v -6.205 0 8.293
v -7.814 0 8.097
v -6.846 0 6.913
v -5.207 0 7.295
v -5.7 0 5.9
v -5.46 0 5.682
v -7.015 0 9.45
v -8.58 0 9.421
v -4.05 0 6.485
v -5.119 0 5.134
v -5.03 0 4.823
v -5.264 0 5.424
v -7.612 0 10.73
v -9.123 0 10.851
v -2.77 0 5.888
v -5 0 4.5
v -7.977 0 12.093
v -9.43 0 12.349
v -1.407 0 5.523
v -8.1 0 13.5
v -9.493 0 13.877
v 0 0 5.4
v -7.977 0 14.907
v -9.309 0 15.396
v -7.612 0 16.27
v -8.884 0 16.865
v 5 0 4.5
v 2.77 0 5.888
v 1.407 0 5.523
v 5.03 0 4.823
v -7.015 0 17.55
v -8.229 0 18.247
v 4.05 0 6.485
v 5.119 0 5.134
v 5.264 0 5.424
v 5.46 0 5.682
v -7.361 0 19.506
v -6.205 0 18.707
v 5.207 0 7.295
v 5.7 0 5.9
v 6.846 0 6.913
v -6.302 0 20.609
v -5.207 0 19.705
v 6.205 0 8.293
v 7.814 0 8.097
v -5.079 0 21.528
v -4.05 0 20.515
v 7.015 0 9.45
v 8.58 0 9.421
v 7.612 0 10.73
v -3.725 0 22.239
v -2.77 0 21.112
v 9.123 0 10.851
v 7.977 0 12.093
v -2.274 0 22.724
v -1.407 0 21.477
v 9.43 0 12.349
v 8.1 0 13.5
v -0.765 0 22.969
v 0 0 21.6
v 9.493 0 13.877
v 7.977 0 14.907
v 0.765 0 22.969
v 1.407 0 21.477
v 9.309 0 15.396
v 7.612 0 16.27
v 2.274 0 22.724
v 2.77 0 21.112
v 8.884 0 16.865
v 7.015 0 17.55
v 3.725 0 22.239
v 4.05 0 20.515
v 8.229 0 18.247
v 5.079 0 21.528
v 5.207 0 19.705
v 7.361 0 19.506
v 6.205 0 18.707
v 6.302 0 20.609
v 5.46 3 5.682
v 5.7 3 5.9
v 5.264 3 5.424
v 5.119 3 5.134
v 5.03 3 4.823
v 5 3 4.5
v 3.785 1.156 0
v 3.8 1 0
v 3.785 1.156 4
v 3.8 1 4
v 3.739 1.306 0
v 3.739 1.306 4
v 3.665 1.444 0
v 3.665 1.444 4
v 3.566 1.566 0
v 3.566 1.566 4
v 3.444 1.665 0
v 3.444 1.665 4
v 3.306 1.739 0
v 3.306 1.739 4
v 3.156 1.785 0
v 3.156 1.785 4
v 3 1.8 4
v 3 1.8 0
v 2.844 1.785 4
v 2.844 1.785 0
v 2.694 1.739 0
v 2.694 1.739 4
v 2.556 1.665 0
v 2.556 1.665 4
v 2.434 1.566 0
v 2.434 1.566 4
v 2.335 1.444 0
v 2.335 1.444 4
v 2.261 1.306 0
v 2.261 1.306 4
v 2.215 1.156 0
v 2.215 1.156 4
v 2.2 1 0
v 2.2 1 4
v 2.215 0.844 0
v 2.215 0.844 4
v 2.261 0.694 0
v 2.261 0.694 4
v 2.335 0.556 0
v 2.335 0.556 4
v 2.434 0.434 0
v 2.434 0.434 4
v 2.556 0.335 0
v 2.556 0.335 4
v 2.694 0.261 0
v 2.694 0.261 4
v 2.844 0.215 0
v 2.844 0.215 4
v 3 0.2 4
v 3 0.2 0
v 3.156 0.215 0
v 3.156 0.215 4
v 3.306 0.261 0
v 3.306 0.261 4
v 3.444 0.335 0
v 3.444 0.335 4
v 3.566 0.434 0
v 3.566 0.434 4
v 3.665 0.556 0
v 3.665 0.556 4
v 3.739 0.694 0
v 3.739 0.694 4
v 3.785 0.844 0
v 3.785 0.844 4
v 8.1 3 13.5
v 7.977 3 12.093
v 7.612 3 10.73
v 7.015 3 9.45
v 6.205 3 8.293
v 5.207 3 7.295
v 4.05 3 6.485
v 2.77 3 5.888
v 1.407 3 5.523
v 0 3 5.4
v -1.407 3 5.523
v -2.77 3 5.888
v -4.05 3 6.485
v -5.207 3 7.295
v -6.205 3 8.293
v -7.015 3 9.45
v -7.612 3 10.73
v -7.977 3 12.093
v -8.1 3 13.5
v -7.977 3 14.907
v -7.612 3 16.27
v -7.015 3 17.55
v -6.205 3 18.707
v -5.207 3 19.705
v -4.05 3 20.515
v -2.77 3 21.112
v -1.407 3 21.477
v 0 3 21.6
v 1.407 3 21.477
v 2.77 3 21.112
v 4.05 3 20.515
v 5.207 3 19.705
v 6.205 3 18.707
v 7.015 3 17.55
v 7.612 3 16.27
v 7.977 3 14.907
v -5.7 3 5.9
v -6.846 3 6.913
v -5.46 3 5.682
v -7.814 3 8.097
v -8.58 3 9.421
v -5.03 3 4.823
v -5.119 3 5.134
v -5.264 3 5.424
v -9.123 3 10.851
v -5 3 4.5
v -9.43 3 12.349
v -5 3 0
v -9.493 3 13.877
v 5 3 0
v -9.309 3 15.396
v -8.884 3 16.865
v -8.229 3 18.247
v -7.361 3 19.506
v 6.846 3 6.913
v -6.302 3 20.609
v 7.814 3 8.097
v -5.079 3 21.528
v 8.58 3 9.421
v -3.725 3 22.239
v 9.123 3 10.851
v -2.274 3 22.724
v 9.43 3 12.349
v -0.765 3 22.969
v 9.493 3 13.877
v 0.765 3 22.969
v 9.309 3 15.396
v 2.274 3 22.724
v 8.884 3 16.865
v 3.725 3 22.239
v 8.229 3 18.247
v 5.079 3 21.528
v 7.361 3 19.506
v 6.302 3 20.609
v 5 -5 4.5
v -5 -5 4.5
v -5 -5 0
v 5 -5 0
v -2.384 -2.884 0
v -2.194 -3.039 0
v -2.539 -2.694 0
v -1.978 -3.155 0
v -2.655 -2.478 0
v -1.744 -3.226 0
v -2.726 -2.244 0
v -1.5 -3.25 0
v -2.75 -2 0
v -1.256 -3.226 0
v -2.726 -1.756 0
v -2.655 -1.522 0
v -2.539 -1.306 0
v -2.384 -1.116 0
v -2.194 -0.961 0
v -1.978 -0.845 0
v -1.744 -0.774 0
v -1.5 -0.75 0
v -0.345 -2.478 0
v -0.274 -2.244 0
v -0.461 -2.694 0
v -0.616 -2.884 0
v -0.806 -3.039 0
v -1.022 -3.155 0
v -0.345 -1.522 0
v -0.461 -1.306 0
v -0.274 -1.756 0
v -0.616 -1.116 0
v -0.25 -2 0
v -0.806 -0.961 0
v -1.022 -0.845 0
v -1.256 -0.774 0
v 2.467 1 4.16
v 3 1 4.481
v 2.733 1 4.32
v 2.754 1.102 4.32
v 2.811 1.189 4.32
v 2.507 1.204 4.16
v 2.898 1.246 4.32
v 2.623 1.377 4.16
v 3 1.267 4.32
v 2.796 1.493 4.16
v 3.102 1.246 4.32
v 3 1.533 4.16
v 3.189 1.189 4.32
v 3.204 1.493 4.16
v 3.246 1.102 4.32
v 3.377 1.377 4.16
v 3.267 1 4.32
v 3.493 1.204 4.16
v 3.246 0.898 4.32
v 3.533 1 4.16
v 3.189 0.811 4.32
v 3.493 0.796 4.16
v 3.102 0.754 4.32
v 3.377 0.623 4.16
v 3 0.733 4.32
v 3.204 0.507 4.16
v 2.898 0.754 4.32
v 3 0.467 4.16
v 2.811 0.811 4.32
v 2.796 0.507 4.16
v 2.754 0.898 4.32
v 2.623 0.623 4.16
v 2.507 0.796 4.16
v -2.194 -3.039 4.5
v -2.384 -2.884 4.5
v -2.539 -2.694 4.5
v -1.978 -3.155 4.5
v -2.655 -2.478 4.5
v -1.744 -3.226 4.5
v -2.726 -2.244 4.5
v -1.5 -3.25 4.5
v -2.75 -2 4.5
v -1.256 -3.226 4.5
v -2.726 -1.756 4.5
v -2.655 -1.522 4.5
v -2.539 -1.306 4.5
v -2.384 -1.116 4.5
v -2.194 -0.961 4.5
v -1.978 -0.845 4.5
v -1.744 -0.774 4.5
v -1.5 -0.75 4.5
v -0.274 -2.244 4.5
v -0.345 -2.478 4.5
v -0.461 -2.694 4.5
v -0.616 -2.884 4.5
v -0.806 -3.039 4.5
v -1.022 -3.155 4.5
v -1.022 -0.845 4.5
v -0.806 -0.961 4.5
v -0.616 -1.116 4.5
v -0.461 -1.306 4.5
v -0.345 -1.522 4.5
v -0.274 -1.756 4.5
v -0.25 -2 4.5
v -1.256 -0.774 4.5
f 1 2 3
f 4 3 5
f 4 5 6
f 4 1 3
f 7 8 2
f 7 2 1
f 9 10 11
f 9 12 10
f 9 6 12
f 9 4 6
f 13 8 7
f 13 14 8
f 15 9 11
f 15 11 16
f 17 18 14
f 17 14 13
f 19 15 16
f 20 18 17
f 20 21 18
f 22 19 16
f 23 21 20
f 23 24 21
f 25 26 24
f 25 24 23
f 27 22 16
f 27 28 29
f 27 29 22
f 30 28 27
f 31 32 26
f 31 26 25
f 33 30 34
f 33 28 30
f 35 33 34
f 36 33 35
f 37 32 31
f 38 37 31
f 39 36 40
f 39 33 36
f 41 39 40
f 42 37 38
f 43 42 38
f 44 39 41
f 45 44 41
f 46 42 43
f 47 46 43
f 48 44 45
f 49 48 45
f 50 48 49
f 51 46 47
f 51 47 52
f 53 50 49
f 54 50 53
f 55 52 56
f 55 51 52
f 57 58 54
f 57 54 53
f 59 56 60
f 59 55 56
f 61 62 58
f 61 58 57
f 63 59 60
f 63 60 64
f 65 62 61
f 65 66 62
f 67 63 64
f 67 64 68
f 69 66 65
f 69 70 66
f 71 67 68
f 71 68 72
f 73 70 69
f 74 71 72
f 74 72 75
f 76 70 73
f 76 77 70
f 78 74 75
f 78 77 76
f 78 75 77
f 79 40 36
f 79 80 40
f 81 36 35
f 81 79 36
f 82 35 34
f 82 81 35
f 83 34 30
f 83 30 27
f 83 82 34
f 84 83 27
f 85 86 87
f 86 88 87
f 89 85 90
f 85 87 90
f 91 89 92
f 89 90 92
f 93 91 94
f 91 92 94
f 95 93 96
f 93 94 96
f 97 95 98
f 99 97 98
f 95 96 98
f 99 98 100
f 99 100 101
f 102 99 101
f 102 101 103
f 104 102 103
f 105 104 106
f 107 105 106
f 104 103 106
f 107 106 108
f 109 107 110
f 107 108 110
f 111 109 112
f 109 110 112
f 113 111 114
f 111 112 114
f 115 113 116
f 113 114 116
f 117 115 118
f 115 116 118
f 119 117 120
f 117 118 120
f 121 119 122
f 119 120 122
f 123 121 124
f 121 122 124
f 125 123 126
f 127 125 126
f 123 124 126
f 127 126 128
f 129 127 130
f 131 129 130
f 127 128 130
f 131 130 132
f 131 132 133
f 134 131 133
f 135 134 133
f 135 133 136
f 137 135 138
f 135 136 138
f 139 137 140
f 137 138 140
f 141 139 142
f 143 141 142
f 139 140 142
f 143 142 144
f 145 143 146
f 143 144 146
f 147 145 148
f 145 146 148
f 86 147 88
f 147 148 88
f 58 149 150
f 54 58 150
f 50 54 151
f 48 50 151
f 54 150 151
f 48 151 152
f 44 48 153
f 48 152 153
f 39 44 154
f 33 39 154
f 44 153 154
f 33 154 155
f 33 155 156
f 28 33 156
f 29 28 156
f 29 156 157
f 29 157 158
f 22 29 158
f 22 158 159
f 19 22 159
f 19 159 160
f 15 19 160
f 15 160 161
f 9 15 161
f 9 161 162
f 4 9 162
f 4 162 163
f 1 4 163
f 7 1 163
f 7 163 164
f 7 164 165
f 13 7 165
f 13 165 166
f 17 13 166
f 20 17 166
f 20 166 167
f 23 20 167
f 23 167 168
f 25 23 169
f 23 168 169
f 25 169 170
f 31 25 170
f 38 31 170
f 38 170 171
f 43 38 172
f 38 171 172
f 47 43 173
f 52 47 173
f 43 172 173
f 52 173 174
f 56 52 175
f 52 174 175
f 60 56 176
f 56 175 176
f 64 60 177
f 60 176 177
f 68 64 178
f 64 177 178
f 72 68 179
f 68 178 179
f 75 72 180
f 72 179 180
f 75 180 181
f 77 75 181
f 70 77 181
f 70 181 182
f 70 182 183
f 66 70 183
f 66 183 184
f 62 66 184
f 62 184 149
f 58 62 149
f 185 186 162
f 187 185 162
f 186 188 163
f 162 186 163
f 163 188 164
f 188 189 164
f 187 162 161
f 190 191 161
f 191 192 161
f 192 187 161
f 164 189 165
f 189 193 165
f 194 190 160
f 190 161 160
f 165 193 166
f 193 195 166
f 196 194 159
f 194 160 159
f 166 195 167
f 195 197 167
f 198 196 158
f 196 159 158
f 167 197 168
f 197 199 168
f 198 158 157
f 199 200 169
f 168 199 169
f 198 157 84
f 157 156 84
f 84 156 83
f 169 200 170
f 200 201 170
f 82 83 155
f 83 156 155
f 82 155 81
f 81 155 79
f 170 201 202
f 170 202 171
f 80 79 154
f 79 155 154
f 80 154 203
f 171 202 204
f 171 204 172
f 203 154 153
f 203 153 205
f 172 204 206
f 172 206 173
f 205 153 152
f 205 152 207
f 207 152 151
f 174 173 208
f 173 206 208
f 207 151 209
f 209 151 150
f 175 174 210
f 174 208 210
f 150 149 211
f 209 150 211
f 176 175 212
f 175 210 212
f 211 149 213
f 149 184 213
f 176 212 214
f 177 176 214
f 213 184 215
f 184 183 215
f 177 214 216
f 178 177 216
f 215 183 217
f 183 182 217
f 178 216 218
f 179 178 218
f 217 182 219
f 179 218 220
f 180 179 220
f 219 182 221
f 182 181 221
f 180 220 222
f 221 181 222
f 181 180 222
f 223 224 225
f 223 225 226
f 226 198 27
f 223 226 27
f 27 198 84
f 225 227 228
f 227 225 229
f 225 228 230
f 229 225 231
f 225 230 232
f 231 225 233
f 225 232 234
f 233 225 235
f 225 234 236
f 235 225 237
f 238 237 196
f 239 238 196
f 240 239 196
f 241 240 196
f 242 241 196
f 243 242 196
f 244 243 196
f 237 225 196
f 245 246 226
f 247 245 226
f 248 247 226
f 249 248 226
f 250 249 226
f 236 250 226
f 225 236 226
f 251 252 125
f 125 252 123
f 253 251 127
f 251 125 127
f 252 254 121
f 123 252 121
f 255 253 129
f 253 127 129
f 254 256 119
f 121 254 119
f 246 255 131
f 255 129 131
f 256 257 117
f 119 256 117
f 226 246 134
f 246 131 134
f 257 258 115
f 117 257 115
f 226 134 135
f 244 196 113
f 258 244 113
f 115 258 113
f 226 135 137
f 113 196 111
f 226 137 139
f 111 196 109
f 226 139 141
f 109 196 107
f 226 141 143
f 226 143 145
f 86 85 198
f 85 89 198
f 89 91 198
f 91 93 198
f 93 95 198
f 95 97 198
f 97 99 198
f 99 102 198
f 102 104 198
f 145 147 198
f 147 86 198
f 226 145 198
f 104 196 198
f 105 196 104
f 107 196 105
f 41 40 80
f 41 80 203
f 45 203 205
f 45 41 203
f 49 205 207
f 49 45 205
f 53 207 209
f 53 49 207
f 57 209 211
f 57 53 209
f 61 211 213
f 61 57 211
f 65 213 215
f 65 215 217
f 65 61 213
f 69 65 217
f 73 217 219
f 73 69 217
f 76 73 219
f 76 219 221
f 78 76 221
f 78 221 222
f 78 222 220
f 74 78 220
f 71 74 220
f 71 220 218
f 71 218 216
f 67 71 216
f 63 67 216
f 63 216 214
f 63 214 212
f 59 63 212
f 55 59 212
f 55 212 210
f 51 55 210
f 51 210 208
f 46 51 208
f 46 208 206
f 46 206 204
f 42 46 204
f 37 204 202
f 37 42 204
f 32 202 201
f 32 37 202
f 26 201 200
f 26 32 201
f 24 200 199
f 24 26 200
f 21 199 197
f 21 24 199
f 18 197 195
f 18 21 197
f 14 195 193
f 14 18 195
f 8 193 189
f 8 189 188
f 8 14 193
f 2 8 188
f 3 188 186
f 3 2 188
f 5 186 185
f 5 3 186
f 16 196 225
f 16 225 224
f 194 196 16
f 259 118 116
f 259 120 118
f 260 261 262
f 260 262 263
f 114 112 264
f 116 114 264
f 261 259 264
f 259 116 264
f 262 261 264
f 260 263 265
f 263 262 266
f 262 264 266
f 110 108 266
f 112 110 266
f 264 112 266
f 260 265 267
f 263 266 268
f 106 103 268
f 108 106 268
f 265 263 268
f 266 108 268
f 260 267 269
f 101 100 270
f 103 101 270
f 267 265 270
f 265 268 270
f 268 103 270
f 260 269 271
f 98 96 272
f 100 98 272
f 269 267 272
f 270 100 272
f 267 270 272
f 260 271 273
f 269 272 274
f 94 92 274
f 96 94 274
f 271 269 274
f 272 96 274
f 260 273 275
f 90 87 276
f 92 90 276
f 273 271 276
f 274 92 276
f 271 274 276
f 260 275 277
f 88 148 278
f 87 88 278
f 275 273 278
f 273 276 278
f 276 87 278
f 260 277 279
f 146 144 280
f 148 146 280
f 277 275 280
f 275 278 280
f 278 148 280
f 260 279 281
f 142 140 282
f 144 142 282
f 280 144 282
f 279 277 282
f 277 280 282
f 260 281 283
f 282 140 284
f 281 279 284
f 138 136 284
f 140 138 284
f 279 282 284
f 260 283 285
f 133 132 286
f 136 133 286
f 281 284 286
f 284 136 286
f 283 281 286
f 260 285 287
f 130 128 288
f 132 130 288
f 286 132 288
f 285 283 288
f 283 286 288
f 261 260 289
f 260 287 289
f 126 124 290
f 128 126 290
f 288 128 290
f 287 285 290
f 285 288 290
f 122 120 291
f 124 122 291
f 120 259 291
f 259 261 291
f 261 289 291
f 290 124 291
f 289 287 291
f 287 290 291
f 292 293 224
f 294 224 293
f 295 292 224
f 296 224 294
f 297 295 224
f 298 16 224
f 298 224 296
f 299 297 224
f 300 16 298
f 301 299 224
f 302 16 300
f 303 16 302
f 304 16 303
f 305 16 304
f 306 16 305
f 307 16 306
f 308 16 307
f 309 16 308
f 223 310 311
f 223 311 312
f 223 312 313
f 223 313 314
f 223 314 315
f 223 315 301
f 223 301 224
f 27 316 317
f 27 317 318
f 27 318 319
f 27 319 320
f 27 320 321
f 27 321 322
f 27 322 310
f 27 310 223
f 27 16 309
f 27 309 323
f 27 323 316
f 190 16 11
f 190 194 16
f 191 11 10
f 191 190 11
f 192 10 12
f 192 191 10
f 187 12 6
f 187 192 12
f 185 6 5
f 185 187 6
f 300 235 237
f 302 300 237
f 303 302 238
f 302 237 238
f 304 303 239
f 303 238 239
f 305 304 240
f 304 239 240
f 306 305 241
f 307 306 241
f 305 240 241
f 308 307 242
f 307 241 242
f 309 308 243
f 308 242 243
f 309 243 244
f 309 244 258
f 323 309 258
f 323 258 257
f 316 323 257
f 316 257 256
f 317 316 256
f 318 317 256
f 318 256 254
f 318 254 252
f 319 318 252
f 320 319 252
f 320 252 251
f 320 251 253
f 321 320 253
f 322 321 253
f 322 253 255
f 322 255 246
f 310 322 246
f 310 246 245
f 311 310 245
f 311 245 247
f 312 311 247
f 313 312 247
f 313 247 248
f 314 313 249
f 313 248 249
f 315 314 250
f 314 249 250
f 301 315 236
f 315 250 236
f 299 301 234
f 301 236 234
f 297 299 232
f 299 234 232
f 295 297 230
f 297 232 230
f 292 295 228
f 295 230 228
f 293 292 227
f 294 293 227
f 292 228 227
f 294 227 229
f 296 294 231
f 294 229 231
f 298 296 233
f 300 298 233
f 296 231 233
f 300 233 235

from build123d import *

# Parameters (mm, degrees)
BOSS_EXTRUDE1_DEPTH            = 3
SKETCH2_W                      = 10
SKETCH2_H                      = 4.5
BOSS_EXTRUDE2_DEPTH            = 5
F_1_6_1_6_DIAMETER_HOLE1_D     = 1.6
F_1_6_1_6_DIAMETER_HOLE1_DEPTH = 4
F_1_6_1_6_DIAMETER_HOLE1_TIP   = 0.480688495
F_2_5_2_5_DIAMETER_HOLE1_D     = 2.5
F_2_5_2_5_DIAMETER_HOLE1_DEPTH = 4.5
M14_CLEARANCE_HOLE1_D          = 16.2
M14_CLEARANCE_HOLE1_DEPTH      = 3
FILLET1_R                      = 1.749999932


with BuildPart() as part:
    # Sketch1 → Boss-Extrude1 (new body)
    with BuildSketch(Plane.XZ):
        with BuildLine():
            Line((-5, 5.422252789), (-5, 0))
            Line((-5, 0), (5, 0))
            Line((5, 0), (5, 5.422252789))
            ThreePointArc((5, 5.422252789), (0, 23), (-5, 5.422252789))
        make_face()
    extrude(amount=-BOSS_EXTRUDE1_DEPTH)

    # Sketch2 → Boss-Extrude2 (add)
    with BuildSketch(Plane.XZ):
        with Locations((0, 2.25)):
            Rectangle(SKETCH2_W, SKETCH2_H)
    extrude(amount=BOSS_EXTRUDE2_DEPTH)

    # Ø1.6 (1.6) Diameter Hole1
    with Locations(Plane(origin=(0, 0, 0), x_dir=(-1, 0, 0), z_dir=(0, 0, -1))):
        with Locations((-3, 1)):
            Hole(F_1_6_1_6_DIAMETER_HOLE1_D / 2, depth=F_1_6_1_6_DIAMETER_HOLE1_DEPTH)
            with Locations((0, 0, -(F_1_6_1_6_DIAMETER_HOLE1_DEPTH + F_1_6_1_6_DIAMETER_HOLE1_TIP / 2))):  # 118° drill point
                Cone(0, F_1_6_1_6_DIAMETER_HOLE1_D / 2, F_1_6_1_6_DIAMETER_HOLE1_TIP, mode=Mode.SUBTRACT)

    # Ø2.5 (2.5) Diameter Hole1
    with Locations(Plane.XY.offset(4.5)):
        with Locations((-1.5, -2)):
            Hole(F_2_5_2_5_DIAMETER_HOLE1_D / 2, depth=F_2_5_2_5_DIAMETER_HOLE1_DEPTH)

    # M14 Clearance Hole1
    with Locations(Plane(origin=(0, 0, 0), x_dir=(-1, 0, 0), z_dir=(0, -1, 0))):
        with Locations((0, -13.5)):
            Hole(M14_CLEARANCE_HOLE1_D / 2, depth=M14_CLEARANCE_HOLE1_DEPTH)

    # Fillet1
    fillet1_edges = [part.edges().sort_by_distance(p)[0] for p in [
        (-5, 1.5, 5.422252789),
        (5, 1.5, 5.422252789),
    ]]
    fillet(fillet1_edges, radius=FILLET1_R)


solid = part.part
